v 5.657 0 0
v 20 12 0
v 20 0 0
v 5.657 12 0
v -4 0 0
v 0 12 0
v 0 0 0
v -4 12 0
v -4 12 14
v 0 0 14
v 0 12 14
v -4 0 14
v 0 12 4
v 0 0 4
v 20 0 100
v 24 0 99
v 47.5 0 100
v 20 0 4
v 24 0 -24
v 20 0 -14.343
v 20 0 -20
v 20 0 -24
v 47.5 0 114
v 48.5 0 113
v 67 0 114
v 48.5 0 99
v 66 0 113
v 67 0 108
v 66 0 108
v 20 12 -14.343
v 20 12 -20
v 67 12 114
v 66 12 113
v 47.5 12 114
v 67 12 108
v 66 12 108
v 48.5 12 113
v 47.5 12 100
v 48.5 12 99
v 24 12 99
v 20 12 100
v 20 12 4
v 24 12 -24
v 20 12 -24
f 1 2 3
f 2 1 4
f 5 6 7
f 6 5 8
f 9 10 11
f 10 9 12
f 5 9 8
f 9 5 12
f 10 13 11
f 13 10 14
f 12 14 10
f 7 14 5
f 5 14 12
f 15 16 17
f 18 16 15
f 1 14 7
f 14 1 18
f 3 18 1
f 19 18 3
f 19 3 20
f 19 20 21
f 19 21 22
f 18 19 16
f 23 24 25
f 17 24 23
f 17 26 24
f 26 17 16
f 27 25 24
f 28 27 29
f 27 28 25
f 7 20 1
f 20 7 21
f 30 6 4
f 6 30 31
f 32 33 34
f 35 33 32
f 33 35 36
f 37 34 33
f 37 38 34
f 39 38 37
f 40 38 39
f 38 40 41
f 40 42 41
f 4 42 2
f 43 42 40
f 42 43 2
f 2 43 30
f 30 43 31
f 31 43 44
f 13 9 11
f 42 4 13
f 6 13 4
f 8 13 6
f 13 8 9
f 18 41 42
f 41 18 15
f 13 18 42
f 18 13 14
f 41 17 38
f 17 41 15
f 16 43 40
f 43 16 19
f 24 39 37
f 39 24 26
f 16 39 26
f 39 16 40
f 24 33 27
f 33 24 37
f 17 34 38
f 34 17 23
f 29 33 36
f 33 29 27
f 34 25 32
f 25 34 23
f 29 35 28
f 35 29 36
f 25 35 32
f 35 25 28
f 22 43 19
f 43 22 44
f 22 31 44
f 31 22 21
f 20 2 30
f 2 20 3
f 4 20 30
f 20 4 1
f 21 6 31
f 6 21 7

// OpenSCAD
staerke_zarge = 1;    // materialstaerke an der Zarge (tb1, th1, tb2)
staerke = 4.0;          // Materialstärke der restlichen komponenten
breite = 12.0;          // Objektbreite
s = 5.0;
tb1 = 14.5; 
th1 = 13;
tb2 = 24.5;
hh1 = 100;
hb1 = 20;
hh2 = 10;
hhs = 20;               // Support, damit der Halter sich nicht zu stark biegt
versteifungen_an_tuer = true;  // Support: zus. Versteifung des Hakens (hh1, hh2, hb1, hhs)
color = "lightgreen";
/*

                _tb1_
               |     | s
           th1 |
               |
          _tb2_|
         |   
         |
         | hh1
    |    |
 hh2|____|
     hb1 | 
         |hhs

*/

grundaufbau();
support();

if (versteifungen_an_tuer)
    versteifungen();



//color(color)
//rotate([90,0,0])
module grundaufbau() {
    rotate([0, 270, 0])
        cube([hh2 + staerke, breite, staerke], false);
    cube([hb1, breite, staerke], false);

    translate([hb1 + staerke, 0, 0])
        rotate([0, 270, 0])
            cube([hh1, breite, staerke], false);

    // Design des Hakens zwischen Tuer und Zarge
    color("lightgray")
    translate([hb1 + staerke, 0, hh1 - staerke_zarge])
        cube([tb2, breite, staerke_zarge], false);

    color("green")
    translate([hb1 + staerke + tb2, 0, hh1])
        rotate([0, 270, 0])
            cube([th1 , breite, staerke_zarge], false);

    color("yellow")
    translate([hb1 + staerke + tb2 - staerke_zarge, 0, hh1 + th1])
        cube([tb1+ staerke, breite, staerke_zarge], false);

    color("lightblue")
    translate([hb1 + staerke + tb2 - staerke_zarge + tb1+staerke, 0, hh1 + th1 +staerke_zarge])
        rotate([0, 90, 0])
            cube([s+ staerke_zarge, breite, staerke_zarge], false);
}

module support() {
    translate([hb1, 0, 0])
        rotate([0, 90, 0])
            cube([hhs + staerke, breite, staerke], false);
}

module versteifungen() {
    rotate([0, 45, 0])
        cube([sqrt((hb1*hb1 * 2)), breite, staerke], false);
}
